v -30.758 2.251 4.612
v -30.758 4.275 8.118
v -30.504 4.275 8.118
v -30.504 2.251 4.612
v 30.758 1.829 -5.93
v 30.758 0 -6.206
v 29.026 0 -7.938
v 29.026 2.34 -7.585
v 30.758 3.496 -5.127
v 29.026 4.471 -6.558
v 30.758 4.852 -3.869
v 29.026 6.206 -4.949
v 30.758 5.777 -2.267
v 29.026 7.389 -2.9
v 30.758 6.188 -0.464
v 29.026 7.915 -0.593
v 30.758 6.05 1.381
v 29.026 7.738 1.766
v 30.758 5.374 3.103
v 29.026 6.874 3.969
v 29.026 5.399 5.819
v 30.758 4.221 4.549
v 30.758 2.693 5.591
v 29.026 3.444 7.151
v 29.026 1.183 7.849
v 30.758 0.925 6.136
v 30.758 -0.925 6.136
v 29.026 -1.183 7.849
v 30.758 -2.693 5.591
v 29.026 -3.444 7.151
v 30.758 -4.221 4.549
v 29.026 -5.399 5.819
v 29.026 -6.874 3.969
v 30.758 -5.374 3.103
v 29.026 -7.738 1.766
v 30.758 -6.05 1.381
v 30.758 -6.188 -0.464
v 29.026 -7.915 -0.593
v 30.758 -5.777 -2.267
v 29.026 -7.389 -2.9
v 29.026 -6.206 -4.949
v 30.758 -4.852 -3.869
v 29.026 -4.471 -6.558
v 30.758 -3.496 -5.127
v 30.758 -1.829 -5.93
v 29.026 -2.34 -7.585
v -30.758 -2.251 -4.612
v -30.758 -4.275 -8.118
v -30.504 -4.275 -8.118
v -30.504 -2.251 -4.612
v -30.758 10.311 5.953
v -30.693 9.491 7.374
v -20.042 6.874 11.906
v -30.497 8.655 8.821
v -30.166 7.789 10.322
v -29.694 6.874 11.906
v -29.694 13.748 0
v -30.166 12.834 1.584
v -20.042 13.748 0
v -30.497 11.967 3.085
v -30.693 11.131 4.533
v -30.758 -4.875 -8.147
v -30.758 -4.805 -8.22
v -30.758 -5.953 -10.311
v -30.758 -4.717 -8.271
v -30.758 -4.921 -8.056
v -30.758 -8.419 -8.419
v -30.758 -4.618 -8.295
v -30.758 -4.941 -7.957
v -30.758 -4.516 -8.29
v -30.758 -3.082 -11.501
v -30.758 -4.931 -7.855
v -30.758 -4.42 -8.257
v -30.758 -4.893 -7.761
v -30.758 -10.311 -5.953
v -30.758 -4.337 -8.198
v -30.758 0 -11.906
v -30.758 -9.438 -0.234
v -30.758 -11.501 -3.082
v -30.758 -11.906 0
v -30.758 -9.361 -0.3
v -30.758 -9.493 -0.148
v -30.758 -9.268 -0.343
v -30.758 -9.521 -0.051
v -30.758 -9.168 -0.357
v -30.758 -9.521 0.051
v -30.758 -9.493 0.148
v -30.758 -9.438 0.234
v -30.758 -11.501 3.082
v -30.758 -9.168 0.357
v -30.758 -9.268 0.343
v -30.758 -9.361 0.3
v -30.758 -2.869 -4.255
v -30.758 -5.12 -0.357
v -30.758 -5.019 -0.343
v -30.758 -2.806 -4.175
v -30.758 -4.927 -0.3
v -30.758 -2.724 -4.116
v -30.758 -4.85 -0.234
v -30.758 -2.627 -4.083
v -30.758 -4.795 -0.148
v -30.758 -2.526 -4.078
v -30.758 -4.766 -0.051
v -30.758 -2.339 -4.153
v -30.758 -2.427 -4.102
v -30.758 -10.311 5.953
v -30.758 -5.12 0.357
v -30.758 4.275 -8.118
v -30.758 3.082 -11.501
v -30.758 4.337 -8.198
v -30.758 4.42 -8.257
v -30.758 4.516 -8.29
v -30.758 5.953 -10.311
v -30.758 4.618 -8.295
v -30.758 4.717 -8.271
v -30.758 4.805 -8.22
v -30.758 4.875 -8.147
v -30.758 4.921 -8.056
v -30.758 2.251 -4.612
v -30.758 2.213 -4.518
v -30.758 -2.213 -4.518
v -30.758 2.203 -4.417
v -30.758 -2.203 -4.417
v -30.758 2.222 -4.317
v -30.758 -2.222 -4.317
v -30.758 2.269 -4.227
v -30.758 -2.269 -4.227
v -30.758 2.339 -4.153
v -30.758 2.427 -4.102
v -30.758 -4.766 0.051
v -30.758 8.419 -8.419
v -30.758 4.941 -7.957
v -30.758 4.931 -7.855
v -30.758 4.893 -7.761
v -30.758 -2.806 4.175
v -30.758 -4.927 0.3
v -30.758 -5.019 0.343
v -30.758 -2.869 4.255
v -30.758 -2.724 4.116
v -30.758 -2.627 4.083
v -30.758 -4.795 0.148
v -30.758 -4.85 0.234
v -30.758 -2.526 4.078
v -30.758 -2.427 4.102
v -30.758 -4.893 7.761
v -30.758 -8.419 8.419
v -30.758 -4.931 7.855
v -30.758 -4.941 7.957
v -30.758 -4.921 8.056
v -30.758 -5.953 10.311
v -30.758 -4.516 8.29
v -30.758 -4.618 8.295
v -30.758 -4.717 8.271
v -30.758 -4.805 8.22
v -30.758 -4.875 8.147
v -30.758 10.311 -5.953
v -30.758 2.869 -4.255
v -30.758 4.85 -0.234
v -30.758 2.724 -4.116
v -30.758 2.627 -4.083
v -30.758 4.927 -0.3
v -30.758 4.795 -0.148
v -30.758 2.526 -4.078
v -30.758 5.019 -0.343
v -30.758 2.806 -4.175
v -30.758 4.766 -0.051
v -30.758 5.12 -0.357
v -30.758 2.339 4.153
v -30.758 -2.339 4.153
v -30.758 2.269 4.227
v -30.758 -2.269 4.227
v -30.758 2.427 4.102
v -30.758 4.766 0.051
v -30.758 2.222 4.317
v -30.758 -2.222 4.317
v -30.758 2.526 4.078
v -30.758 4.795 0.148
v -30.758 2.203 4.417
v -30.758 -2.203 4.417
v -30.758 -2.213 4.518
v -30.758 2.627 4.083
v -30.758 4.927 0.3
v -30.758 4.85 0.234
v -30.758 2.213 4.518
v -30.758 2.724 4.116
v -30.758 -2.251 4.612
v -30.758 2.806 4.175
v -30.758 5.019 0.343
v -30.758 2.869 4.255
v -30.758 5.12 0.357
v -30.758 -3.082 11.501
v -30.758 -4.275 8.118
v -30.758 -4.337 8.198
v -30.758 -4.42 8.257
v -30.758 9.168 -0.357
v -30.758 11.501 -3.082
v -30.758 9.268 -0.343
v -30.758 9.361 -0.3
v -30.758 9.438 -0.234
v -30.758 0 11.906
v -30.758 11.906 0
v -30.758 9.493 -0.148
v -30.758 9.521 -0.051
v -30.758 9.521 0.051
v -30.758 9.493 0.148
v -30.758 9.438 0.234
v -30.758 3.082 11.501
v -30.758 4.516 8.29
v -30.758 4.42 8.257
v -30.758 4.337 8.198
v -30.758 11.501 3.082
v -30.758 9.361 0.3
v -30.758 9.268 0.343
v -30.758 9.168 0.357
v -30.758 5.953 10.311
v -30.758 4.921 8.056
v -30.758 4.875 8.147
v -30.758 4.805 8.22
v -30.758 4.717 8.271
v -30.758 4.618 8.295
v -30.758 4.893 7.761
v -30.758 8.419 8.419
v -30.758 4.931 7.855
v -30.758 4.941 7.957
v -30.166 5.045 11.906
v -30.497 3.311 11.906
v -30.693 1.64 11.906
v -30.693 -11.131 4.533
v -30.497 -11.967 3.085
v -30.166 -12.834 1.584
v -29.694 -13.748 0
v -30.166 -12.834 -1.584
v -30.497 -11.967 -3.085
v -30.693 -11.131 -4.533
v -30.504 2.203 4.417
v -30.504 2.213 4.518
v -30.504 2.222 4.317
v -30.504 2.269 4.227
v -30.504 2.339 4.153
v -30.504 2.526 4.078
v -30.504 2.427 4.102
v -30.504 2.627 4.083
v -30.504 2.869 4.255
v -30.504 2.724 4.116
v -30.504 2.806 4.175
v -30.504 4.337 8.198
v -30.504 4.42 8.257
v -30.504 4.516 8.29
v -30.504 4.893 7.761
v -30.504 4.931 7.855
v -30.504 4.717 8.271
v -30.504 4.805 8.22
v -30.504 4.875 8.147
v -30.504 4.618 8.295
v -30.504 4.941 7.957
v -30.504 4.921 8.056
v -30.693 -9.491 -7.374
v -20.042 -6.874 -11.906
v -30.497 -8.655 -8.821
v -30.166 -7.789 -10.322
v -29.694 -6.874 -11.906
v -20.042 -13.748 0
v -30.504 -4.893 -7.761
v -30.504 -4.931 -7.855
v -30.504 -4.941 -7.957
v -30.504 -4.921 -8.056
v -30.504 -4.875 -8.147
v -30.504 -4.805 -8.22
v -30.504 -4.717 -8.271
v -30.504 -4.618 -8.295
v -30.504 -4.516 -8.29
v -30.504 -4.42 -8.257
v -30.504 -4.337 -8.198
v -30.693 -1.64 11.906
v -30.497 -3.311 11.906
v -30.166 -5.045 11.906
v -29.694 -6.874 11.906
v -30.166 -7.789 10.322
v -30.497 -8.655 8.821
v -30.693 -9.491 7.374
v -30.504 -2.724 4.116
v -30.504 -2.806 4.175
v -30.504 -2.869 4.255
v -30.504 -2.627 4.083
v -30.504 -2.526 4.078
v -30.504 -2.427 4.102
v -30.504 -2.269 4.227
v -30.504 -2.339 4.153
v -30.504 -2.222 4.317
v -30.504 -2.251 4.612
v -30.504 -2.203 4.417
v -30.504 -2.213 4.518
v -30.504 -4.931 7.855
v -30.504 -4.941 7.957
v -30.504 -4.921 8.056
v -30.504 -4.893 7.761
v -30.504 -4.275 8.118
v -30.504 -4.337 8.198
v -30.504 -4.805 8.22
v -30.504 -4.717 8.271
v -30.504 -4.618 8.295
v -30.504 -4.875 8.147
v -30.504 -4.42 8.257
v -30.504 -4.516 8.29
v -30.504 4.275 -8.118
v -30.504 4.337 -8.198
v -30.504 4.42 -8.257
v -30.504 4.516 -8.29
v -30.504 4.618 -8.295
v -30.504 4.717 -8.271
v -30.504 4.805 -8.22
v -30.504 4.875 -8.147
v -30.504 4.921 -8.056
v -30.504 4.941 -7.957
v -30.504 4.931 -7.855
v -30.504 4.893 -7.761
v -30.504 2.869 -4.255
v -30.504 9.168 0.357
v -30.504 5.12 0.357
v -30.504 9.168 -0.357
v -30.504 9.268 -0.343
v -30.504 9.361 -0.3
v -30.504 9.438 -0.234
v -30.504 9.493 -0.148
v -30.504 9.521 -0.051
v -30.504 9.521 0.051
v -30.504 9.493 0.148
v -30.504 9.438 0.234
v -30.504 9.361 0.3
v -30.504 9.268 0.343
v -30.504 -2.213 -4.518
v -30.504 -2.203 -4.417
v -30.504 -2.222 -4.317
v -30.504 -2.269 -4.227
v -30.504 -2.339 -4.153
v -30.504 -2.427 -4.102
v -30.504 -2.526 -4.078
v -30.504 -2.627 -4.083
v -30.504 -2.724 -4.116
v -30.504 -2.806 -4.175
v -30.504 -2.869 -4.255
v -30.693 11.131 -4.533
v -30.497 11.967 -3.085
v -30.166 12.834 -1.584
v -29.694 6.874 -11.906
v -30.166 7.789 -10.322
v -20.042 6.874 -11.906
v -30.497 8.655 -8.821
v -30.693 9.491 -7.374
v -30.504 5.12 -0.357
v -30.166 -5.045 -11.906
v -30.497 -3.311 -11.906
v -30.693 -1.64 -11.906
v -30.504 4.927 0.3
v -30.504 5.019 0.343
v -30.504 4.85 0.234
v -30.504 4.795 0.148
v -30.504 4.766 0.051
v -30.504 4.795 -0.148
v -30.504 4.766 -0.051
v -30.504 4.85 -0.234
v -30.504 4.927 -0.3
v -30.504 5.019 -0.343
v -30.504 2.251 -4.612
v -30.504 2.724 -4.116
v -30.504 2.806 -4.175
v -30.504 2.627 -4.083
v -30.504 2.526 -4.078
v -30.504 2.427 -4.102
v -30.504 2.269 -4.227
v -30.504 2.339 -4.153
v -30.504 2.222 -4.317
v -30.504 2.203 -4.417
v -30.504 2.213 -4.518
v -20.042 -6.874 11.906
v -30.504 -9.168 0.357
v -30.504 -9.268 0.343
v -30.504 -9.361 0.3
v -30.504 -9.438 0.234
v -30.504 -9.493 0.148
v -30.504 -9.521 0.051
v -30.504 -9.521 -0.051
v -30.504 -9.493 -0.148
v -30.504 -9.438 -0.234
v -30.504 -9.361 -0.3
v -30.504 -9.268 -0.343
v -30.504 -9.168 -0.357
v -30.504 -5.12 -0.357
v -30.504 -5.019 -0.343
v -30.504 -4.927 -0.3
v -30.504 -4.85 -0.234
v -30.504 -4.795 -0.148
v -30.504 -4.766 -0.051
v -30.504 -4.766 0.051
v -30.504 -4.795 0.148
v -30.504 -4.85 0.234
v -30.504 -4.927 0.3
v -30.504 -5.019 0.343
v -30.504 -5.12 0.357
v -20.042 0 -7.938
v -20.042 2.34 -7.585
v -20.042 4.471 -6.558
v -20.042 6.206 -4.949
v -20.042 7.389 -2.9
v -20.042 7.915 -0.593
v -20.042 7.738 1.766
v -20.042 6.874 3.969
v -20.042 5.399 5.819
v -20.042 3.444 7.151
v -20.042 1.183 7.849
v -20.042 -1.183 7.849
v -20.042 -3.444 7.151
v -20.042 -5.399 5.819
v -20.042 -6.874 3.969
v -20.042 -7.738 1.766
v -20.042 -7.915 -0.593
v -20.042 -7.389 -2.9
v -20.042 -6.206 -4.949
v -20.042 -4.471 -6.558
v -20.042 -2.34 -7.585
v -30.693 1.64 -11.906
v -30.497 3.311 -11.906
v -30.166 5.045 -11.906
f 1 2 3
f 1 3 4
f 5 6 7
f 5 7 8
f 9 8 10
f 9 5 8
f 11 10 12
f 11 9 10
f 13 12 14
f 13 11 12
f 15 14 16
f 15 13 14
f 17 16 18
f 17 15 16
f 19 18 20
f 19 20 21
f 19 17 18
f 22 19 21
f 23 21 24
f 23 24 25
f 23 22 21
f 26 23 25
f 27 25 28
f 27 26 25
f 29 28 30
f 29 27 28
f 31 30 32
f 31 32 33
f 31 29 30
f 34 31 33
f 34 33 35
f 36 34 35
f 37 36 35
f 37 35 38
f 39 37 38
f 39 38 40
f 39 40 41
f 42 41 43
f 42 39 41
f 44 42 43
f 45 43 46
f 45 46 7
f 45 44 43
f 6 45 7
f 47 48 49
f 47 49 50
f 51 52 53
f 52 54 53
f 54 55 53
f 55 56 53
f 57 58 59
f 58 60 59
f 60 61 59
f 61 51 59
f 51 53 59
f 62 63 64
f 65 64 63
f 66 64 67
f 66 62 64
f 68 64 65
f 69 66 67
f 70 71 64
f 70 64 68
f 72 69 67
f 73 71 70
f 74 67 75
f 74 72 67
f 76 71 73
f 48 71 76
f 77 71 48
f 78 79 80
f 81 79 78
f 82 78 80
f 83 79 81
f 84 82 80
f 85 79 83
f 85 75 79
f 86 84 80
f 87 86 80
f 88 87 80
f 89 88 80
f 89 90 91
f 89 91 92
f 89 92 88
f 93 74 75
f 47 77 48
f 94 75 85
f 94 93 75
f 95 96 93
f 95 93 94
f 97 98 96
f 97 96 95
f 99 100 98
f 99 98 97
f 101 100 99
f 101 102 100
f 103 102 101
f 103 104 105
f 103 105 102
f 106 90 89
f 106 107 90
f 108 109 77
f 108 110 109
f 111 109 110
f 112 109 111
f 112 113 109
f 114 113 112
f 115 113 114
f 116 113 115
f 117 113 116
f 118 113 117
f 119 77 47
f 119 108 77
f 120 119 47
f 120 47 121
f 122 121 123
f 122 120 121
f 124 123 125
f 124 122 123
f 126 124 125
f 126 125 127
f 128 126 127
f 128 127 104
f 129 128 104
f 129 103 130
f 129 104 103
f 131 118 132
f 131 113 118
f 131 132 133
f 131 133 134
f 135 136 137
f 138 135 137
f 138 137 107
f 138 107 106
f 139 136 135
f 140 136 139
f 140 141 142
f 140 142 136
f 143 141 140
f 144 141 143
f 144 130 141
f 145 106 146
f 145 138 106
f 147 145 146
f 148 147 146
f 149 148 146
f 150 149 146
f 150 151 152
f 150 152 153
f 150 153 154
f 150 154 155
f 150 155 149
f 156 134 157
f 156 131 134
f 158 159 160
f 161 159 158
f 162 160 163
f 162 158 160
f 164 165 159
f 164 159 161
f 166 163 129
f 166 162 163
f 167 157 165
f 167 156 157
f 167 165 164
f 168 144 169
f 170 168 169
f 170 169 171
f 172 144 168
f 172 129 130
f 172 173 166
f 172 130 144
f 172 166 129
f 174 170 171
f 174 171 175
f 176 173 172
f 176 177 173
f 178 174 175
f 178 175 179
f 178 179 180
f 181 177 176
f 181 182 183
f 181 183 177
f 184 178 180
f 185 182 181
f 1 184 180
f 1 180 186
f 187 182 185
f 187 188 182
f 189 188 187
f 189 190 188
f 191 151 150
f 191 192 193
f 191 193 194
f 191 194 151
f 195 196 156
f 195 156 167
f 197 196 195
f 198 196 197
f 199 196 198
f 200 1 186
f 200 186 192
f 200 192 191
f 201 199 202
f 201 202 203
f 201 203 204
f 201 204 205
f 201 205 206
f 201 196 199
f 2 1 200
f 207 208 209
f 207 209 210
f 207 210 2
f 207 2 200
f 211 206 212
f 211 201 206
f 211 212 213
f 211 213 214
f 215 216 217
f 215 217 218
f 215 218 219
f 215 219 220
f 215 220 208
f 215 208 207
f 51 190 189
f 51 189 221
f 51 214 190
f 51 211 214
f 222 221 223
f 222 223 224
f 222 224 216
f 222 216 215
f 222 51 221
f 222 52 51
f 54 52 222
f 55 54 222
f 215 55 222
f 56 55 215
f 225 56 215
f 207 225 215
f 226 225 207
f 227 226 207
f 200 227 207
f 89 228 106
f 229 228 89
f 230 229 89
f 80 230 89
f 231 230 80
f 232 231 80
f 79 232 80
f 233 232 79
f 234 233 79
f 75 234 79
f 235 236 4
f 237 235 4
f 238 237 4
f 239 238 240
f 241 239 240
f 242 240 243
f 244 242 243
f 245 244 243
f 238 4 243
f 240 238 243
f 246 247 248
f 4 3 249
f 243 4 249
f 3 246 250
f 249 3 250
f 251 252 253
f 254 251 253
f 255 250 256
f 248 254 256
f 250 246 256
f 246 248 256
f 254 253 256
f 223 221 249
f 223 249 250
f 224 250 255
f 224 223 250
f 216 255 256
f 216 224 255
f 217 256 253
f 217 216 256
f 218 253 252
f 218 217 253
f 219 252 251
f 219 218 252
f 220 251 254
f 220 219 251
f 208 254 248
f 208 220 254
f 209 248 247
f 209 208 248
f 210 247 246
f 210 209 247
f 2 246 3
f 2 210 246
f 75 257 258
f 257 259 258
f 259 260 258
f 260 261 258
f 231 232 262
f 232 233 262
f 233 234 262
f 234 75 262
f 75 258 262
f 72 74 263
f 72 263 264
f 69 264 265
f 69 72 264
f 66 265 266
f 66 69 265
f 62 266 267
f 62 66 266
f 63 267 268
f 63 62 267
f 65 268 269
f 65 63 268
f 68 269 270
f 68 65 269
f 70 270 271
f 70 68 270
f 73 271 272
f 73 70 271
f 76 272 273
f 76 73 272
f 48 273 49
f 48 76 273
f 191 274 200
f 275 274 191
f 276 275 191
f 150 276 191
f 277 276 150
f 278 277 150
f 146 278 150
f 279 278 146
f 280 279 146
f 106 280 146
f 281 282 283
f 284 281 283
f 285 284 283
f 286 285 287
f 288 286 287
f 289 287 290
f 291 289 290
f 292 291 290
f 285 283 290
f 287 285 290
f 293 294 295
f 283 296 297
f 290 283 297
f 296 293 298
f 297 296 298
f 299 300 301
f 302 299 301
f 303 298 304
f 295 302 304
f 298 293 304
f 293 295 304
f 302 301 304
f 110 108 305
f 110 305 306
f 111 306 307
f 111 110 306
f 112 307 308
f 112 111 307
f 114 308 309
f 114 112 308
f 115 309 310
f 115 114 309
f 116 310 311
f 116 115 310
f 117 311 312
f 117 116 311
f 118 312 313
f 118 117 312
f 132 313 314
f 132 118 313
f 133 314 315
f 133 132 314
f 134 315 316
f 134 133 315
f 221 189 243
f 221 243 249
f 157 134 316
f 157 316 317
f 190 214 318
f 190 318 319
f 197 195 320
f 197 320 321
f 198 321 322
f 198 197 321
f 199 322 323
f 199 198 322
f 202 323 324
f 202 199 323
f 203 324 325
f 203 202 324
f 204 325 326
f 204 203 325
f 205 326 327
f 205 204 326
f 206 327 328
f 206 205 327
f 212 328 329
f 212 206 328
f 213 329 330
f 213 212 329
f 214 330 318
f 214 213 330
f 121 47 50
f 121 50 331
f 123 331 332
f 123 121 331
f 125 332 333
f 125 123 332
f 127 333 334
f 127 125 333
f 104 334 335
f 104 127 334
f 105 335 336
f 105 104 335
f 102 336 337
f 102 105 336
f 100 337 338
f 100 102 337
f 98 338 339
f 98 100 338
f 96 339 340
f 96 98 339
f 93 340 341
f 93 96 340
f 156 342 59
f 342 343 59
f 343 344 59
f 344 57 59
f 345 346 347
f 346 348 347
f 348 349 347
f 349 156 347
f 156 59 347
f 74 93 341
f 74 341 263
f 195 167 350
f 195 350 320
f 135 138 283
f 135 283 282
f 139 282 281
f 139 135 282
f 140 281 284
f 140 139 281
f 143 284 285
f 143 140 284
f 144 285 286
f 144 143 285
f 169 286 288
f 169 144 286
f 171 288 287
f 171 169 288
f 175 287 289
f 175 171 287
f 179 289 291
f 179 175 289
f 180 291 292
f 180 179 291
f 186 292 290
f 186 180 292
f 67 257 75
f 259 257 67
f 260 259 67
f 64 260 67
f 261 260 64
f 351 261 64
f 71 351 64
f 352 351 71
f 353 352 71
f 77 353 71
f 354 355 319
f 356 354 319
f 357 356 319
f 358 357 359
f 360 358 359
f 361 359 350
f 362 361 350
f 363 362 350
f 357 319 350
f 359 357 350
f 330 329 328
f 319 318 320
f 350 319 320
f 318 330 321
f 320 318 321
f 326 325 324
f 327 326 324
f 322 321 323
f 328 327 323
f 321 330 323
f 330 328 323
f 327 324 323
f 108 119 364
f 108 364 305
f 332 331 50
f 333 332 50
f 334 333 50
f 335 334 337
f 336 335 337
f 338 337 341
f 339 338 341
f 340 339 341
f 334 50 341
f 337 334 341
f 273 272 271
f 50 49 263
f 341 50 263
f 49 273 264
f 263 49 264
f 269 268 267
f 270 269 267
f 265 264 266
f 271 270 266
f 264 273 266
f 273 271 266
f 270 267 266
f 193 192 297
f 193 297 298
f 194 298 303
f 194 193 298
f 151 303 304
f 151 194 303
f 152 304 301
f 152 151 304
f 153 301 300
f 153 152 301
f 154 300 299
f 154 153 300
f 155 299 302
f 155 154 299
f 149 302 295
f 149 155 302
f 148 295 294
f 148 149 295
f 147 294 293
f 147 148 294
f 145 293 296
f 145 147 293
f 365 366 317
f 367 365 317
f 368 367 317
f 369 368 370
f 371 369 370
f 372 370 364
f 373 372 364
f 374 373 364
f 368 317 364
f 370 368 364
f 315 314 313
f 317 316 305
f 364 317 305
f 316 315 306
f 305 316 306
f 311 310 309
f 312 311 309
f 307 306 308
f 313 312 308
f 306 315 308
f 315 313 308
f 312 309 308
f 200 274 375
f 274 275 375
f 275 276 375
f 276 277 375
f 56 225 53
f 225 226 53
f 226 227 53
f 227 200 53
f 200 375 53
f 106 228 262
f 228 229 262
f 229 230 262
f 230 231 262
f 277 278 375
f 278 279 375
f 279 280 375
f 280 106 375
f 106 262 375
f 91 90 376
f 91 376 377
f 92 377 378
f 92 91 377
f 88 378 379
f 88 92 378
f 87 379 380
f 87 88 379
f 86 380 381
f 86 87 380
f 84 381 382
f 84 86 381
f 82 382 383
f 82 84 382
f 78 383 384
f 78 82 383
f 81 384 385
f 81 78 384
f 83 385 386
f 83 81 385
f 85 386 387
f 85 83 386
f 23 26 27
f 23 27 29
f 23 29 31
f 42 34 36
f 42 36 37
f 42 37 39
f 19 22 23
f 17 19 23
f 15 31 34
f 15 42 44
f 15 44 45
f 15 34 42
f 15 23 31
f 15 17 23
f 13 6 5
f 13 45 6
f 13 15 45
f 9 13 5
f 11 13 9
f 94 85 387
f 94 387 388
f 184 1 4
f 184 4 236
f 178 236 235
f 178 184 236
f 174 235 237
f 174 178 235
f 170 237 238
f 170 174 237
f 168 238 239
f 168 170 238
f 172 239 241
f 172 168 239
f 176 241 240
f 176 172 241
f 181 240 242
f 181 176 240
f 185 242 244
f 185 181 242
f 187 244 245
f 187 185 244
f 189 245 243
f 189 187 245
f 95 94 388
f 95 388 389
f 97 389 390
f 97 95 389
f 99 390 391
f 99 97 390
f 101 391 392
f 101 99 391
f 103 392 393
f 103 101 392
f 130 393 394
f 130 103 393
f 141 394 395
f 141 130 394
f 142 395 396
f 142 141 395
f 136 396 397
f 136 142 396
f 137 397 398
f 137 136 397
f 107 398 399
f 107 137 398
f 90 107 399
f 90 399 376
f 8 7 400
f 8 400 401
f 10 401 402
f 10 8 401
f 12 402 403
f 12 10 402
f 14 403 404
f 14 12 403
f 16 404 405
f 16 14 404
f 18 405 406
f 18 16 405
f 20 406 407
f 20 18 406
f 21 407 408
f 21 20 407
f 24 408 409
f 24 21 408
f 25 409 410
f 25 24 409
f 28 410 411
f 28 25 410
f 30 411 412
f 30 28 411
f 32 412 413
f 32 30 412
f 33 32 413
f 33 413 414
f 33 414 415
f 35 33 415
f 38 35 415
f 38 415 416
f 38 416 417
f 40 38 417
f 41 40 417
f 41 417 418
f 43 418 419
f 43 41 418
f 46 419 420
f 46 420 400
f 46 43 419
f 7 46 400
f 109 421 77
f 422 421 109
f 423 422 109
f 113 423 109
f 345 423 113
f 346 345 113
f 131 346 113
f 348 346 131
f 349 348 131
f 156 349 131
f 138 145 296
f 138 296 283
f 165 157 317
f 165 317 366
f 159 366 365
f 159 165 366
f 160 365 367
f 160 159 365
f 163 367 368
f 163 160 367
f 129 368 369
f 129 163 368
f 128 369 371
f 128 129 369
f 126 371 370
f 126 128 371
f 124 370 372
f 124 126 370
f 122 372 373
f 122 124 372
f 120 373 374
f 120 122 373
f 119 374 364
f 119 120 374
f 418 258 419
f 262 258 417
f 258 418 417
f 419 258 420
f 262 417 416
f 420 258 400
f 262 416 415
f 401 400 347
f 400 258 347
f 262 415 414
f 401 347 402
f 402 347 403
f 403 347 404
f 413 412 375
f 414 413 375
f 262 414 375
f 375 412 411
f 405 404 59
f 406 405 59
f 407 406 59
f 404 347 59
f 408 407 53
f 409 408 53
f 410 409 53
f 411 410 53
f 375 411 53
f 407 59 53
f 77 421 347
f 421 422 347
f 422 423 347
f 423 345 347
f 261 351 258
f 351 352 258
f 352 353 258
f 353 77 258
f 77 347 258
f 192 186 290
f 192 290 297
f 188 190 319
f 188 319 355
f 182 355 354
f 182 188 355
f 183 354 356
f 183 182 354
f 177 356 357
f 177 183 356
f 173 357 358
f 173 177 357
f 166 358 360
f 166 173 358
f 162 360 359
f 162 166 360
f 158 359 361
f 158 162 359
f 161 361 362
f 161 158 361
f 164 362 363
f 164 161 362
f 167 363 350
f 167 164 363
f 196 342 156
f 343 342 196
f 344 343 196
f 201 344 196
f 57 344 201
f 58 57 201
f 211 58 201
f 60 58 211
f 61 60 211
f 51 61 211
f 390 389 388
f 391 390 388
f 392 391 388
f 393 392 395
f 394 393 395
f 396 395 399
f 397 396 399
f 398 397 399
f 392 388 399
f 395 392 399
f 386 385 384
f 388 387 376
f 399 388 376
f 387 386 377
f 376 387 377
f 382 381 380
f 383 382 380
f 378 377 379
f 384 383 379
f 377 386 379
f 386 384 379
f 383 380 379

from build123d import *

# Parameters (mm, degrees)
SKETCH5_R           = 7.9375
BOSS_EXTRUDE3_DEPTH = 50.8
CHAMFER1_SIZE       = 1.731818182
BOSS_EXTRUDE4_DEPTH = 10.715625
SKETCH8_OUTSIDE_W   = 256.666
SKETCH8_OUTSIDE_H   = 260.35
SKETCH8_OUTSIDE_R   = 11.90625
CUT_EXTRUDE3_DEPTH  = 62.515625
CUT_EXTRUDE3_TAPER  = 60
CUT_EXTRUDE4_DEPTH  = 0.254
CIRPATTERN1_COUNT   = 6


with BuildPart() as part:
    # Sketch5 → Boss-Extrude3 (new body)
    with BuildSketch(Plane(origin=(30.7578125, 0, 0), x_dir=(0, 0, -1), z_dir=(1, 0, 0))):
        Circle(SKETCH5_R)
    extrude(amount=-BOSS_EXTRUDE3_DEPTH)

    # Chamfer1
    chamfer1_edges = [part.edges().sort_by_distance(p)[0] for p in [
        (30.7578125, 0, 7.9375),
    ]]
    chamfer(chamfer1_edges, length=CHAMFER1_SIZE)

    # Sketch6 → Boss-Extrude4 (add)
    with BuildSketch(Plane.ZY.offset(20.0421875)):
        Polygon((11.90625, 6.874076643), (0, 13.748153285), (-11.90625, 6.874076643), (-11.90625, -6.874076643), (0, -13.748153285), (11.90625, -6.874076643), align=None)
    extrude(amount=BOSS_EXTRUDE4_DEPTH)

    # Sketch8 outside → Cut-Extrude3 (cut, through all)
    with BuildSketch(Plane.ZY.offset(30.7578125)):
        Rectangle(SKETCH8_OUTSIDE_W, SKETCH8_OUTSIDE_H)
        Circle(SKETCH8_OUTSIDE_R, mode=Mode.SUBTRACT)
    extrude(amount=-CUT_EXTRUDE3_DEPTH, taper=CUT_EXTRUDE3_TAPER, mode=Mode.SUBTRACT)

    # Sketch12 → Cut-Extrude4 (cut)
    with BuildSketch(Plane.ZY.offset(30.7578125)):
        with BuildLine():
            Line((0.3571875, 9.1678125), (0.3571875, 5.1196875))
            ThreePointArc((0.3571875, 5.1196875), (0, 4.7625), (-0.3571875, 5.1196875))
            Line((-0.3571875, 5.1196875), (-0.3571875, 9.1678125))
            ThreePointArc((-0.3571875, 9.1678125), (0, 9.525), (0.3571875, 9.1678125))
        make_face()
    cut_extrude4 = extrude(amount=-CUT_EXTRUDE4_DEPTH, mode=Mode.SUBTRACT)

    # CirPattern1: Cut-Extrude4 ×6 about axis
    cirpattern1_axis = Axis((0, 0, 0), (1, 0, 0))
    for i in range(1, CIRPATTERN1_COUNT):
        add(cut_extrude4.rotate(cirpattern1_axis, i * 360 / CIRPATTERN1_COUNT), mode=Mode.SUBTRACT)


solid = part.part
